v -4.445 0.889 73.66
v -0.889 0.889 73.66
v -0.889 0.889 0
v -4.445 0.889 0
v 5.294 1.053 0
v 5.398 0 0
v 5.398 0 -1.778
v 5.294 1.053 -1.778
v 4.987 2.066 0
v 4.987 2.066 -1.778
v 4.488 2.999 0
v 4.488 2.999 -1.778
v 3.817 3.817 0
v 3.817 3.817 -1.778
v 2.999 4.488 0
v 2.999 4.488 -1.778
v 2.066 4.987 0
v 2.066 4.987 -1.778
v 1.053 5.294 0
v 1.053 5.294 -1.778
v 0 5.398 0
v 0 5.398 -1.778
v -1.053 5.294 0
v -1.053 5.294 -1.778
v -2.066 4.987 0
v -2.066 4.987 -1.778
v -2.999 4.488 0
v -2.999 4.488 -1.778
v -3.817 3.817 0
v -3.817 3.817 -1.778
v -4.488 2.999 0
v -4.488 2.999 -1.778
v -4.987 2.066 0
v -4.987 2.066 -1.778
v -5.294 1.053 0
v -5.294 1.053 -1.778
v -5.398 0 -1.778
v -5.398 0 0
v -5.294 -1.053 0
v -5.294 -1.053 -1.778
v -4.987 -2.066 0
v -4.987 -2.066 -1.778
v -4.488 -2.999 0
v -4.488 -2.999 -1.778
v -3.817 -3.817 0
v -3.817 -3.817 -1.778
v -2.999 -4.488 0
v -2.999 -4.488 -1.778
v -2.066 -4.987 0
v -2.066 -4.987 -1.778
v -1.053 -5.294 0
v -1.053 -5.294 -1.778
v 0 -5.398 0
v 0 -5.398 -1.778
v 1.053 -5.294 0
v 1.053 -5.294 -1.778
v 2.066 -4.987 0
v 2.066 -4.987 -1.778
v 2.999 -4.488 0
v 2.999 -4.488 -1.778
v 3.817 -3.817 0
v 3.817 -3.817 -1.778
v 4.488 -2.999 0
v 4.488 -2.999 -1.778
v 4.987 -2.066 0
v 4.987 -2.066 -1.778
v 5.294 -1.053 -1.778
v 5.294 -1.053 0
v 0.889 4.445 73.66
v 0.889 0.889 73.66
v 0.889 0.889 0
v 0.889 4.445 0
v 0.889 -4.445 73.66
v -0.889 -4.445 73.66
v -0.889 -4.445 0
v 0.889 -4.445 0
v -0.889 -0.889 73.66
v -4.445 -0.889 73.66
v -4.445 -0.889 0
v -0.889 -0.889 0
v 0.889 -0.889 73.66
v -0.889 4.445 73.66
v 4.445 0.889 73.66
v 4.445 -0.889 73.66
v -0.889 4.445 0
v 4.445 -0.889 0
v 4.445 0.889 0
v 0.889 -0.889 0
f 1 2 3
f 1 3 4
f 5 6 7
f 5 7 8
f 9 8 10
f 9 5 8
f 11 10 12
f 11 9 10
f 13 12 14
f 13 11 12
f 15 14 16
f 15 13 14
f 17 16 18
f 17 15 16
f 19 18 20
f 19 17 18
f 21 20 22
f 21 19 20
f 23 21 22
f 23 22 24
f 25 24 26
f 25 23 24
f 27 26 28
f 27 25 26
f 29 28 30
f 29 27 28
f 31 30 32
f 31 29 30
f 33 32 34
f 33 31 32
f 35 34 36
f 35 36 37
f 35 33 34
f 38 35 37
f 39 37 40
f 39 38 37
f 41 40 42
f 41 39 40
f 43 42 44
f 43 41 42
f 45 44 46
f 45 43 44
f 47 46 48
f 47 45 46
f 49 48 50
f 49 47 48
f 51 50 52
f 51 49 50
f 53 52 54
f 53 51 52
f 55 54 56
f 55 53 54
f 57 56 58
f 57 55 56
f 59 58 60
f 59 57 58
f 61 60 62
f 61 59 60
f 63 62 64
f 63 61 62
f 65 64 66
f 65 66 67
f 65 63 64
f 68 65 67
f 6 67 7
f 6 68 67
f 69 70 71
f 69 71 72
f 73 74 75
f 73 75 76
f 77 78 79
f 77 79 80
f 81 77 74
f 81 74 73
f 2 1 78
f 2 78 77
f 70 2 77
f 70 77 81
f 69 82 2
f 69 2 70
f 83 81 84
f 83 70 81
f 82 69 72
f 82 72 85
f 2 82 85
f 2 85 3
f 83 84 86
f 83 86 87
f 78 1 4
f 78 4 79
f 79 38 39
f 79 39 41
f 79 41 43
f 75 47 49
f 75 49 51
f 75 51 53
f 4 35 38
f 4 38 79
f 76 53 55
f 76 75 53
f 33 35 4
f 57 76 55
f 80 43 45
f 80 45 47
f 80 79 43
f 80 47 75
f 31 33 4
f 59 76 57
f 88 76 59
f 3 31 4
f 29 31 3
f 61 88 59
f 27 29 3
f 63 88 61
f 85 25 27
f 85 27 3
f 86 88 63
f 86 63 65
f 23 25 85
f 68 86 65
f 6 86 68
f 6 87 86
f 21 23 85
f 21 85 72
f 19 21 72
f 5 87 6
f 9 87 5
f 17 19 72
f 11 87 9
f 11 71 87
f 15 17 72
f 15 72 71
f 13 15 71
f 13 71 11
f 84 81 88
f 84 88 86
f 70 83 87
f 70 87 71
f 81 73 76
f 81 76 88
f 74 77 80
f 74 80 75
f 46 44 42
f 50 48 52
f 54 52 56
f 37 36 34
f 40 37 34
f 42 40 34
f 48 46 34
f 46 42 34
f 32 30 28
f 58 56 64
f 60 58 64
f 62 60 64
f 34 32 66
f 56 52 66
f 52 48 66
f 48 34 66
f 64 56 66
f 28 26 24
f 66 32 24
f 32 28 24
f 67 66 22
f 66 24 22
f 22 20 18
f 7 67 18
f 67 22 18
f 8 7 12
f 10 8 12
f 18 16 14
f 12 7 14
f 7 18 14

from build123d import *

# Parameters (mm, degrees)
F1_DEPTH = 73.66
F2_R     = 5.3975
F3_DEPTH = 1.778


with BuildPart() as f1:
    # F0 (on Top) → F1 (new body)
    with BuildSketch(Plane.XY):
        Polygon((0.889, 4.445), (-0.889, 4.445), (-0.889, 0.889), (-4.445, 0.889), (-4.445, -0.889), (-0.889, -0.889), (-0.889, -4.445), (0.889, -4.445), (0.889, -0.889), (4.445, -0.889), (4.445, 0.889), (0.889, 0.889), align=None)
    extrude(amount=F1_DEPTH)

    # F2 (on Top) → F3 (join)
    with BuildSketch(Plane.XY):
        Circle(F2_R)
    extrude(amount=-F3_DEPTH)


solid = f1.part
